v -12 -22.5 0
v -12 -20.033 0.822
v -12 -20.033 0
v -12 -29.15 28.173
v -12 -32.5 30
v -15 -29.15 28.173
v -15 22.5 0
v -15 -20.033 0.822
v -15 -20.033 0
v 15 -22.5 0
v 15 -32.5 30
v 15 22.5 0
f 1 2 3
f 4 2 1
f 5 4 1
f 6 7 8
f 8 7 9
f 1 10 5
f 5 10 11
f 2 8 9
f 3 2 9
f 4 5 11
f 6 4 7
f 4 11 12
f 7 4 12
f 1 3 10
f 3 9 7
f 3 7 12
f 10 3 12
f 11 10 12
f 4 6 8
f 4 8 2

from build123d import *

# Parameters (mm, degrees)
F0_W     = 30
F0_H     = 10
F1_DEPTH = 30
F3_DEPTH = 30.001
F4_W     = 3
F4_H     = 31.6227766017
F5_DEPTH = 2.6
F7_DEPTH = 3


with BuildPart() as f1:
    # F0 (on Top) → F1 (new body)
    with BuildSketch(Plane.XY):
        Polygon((15, 22.5), (-15, 22.5), (-15, -19.5), (-15, -22.5), (15, -22.5), align=None)
        with Locations((0, -27.5)):
            Rectangle(F0_W, F0_H)
    extrude(amount=F1_DEPTH)

    # F2 (on face) → F3 (cut, through all)
    with BuildSketch(Plane.YZ.offset(15)):
        Polygon((-32.5, 0), (-22.5, 0), (-32.5, 30), align=None)
        Polygon((22.5, 30), (-32.5, 30), (22.5, 0), align=None)
    extrude(amount=-F3_DEPTH, mode=Mode.SUBTRACT)

    # F4 (on face) → F5 (cut)
    with BuildSketch(Plane(origin=(0, -20.25, -6.75), x_dir=(1, 0, 0), z_dir=(0, -0.9486832981, -0.316227766))):
        with Locations((-13.5, 22.9265130362)):
            Rectangle(F4_W, F4_H)
    extrude(amount=-F5_DEPTH, mode=Mode.SUBTRACT)

    # F6 (on face) → F7 (cut)
    with BuildSketch(Plane(origin=(-15, 0, 0), x_dir=(0, -1, 0), z_dir=(-1, 0, 0))):
        Polygon((22.5, 0), (20.0334234251, 0.8221921916), (20.0334234251, 0), align=None)
    extrude(amount=-F7_DEPTH, mode=Mode.SUBTRACT)


solid = f1.part
